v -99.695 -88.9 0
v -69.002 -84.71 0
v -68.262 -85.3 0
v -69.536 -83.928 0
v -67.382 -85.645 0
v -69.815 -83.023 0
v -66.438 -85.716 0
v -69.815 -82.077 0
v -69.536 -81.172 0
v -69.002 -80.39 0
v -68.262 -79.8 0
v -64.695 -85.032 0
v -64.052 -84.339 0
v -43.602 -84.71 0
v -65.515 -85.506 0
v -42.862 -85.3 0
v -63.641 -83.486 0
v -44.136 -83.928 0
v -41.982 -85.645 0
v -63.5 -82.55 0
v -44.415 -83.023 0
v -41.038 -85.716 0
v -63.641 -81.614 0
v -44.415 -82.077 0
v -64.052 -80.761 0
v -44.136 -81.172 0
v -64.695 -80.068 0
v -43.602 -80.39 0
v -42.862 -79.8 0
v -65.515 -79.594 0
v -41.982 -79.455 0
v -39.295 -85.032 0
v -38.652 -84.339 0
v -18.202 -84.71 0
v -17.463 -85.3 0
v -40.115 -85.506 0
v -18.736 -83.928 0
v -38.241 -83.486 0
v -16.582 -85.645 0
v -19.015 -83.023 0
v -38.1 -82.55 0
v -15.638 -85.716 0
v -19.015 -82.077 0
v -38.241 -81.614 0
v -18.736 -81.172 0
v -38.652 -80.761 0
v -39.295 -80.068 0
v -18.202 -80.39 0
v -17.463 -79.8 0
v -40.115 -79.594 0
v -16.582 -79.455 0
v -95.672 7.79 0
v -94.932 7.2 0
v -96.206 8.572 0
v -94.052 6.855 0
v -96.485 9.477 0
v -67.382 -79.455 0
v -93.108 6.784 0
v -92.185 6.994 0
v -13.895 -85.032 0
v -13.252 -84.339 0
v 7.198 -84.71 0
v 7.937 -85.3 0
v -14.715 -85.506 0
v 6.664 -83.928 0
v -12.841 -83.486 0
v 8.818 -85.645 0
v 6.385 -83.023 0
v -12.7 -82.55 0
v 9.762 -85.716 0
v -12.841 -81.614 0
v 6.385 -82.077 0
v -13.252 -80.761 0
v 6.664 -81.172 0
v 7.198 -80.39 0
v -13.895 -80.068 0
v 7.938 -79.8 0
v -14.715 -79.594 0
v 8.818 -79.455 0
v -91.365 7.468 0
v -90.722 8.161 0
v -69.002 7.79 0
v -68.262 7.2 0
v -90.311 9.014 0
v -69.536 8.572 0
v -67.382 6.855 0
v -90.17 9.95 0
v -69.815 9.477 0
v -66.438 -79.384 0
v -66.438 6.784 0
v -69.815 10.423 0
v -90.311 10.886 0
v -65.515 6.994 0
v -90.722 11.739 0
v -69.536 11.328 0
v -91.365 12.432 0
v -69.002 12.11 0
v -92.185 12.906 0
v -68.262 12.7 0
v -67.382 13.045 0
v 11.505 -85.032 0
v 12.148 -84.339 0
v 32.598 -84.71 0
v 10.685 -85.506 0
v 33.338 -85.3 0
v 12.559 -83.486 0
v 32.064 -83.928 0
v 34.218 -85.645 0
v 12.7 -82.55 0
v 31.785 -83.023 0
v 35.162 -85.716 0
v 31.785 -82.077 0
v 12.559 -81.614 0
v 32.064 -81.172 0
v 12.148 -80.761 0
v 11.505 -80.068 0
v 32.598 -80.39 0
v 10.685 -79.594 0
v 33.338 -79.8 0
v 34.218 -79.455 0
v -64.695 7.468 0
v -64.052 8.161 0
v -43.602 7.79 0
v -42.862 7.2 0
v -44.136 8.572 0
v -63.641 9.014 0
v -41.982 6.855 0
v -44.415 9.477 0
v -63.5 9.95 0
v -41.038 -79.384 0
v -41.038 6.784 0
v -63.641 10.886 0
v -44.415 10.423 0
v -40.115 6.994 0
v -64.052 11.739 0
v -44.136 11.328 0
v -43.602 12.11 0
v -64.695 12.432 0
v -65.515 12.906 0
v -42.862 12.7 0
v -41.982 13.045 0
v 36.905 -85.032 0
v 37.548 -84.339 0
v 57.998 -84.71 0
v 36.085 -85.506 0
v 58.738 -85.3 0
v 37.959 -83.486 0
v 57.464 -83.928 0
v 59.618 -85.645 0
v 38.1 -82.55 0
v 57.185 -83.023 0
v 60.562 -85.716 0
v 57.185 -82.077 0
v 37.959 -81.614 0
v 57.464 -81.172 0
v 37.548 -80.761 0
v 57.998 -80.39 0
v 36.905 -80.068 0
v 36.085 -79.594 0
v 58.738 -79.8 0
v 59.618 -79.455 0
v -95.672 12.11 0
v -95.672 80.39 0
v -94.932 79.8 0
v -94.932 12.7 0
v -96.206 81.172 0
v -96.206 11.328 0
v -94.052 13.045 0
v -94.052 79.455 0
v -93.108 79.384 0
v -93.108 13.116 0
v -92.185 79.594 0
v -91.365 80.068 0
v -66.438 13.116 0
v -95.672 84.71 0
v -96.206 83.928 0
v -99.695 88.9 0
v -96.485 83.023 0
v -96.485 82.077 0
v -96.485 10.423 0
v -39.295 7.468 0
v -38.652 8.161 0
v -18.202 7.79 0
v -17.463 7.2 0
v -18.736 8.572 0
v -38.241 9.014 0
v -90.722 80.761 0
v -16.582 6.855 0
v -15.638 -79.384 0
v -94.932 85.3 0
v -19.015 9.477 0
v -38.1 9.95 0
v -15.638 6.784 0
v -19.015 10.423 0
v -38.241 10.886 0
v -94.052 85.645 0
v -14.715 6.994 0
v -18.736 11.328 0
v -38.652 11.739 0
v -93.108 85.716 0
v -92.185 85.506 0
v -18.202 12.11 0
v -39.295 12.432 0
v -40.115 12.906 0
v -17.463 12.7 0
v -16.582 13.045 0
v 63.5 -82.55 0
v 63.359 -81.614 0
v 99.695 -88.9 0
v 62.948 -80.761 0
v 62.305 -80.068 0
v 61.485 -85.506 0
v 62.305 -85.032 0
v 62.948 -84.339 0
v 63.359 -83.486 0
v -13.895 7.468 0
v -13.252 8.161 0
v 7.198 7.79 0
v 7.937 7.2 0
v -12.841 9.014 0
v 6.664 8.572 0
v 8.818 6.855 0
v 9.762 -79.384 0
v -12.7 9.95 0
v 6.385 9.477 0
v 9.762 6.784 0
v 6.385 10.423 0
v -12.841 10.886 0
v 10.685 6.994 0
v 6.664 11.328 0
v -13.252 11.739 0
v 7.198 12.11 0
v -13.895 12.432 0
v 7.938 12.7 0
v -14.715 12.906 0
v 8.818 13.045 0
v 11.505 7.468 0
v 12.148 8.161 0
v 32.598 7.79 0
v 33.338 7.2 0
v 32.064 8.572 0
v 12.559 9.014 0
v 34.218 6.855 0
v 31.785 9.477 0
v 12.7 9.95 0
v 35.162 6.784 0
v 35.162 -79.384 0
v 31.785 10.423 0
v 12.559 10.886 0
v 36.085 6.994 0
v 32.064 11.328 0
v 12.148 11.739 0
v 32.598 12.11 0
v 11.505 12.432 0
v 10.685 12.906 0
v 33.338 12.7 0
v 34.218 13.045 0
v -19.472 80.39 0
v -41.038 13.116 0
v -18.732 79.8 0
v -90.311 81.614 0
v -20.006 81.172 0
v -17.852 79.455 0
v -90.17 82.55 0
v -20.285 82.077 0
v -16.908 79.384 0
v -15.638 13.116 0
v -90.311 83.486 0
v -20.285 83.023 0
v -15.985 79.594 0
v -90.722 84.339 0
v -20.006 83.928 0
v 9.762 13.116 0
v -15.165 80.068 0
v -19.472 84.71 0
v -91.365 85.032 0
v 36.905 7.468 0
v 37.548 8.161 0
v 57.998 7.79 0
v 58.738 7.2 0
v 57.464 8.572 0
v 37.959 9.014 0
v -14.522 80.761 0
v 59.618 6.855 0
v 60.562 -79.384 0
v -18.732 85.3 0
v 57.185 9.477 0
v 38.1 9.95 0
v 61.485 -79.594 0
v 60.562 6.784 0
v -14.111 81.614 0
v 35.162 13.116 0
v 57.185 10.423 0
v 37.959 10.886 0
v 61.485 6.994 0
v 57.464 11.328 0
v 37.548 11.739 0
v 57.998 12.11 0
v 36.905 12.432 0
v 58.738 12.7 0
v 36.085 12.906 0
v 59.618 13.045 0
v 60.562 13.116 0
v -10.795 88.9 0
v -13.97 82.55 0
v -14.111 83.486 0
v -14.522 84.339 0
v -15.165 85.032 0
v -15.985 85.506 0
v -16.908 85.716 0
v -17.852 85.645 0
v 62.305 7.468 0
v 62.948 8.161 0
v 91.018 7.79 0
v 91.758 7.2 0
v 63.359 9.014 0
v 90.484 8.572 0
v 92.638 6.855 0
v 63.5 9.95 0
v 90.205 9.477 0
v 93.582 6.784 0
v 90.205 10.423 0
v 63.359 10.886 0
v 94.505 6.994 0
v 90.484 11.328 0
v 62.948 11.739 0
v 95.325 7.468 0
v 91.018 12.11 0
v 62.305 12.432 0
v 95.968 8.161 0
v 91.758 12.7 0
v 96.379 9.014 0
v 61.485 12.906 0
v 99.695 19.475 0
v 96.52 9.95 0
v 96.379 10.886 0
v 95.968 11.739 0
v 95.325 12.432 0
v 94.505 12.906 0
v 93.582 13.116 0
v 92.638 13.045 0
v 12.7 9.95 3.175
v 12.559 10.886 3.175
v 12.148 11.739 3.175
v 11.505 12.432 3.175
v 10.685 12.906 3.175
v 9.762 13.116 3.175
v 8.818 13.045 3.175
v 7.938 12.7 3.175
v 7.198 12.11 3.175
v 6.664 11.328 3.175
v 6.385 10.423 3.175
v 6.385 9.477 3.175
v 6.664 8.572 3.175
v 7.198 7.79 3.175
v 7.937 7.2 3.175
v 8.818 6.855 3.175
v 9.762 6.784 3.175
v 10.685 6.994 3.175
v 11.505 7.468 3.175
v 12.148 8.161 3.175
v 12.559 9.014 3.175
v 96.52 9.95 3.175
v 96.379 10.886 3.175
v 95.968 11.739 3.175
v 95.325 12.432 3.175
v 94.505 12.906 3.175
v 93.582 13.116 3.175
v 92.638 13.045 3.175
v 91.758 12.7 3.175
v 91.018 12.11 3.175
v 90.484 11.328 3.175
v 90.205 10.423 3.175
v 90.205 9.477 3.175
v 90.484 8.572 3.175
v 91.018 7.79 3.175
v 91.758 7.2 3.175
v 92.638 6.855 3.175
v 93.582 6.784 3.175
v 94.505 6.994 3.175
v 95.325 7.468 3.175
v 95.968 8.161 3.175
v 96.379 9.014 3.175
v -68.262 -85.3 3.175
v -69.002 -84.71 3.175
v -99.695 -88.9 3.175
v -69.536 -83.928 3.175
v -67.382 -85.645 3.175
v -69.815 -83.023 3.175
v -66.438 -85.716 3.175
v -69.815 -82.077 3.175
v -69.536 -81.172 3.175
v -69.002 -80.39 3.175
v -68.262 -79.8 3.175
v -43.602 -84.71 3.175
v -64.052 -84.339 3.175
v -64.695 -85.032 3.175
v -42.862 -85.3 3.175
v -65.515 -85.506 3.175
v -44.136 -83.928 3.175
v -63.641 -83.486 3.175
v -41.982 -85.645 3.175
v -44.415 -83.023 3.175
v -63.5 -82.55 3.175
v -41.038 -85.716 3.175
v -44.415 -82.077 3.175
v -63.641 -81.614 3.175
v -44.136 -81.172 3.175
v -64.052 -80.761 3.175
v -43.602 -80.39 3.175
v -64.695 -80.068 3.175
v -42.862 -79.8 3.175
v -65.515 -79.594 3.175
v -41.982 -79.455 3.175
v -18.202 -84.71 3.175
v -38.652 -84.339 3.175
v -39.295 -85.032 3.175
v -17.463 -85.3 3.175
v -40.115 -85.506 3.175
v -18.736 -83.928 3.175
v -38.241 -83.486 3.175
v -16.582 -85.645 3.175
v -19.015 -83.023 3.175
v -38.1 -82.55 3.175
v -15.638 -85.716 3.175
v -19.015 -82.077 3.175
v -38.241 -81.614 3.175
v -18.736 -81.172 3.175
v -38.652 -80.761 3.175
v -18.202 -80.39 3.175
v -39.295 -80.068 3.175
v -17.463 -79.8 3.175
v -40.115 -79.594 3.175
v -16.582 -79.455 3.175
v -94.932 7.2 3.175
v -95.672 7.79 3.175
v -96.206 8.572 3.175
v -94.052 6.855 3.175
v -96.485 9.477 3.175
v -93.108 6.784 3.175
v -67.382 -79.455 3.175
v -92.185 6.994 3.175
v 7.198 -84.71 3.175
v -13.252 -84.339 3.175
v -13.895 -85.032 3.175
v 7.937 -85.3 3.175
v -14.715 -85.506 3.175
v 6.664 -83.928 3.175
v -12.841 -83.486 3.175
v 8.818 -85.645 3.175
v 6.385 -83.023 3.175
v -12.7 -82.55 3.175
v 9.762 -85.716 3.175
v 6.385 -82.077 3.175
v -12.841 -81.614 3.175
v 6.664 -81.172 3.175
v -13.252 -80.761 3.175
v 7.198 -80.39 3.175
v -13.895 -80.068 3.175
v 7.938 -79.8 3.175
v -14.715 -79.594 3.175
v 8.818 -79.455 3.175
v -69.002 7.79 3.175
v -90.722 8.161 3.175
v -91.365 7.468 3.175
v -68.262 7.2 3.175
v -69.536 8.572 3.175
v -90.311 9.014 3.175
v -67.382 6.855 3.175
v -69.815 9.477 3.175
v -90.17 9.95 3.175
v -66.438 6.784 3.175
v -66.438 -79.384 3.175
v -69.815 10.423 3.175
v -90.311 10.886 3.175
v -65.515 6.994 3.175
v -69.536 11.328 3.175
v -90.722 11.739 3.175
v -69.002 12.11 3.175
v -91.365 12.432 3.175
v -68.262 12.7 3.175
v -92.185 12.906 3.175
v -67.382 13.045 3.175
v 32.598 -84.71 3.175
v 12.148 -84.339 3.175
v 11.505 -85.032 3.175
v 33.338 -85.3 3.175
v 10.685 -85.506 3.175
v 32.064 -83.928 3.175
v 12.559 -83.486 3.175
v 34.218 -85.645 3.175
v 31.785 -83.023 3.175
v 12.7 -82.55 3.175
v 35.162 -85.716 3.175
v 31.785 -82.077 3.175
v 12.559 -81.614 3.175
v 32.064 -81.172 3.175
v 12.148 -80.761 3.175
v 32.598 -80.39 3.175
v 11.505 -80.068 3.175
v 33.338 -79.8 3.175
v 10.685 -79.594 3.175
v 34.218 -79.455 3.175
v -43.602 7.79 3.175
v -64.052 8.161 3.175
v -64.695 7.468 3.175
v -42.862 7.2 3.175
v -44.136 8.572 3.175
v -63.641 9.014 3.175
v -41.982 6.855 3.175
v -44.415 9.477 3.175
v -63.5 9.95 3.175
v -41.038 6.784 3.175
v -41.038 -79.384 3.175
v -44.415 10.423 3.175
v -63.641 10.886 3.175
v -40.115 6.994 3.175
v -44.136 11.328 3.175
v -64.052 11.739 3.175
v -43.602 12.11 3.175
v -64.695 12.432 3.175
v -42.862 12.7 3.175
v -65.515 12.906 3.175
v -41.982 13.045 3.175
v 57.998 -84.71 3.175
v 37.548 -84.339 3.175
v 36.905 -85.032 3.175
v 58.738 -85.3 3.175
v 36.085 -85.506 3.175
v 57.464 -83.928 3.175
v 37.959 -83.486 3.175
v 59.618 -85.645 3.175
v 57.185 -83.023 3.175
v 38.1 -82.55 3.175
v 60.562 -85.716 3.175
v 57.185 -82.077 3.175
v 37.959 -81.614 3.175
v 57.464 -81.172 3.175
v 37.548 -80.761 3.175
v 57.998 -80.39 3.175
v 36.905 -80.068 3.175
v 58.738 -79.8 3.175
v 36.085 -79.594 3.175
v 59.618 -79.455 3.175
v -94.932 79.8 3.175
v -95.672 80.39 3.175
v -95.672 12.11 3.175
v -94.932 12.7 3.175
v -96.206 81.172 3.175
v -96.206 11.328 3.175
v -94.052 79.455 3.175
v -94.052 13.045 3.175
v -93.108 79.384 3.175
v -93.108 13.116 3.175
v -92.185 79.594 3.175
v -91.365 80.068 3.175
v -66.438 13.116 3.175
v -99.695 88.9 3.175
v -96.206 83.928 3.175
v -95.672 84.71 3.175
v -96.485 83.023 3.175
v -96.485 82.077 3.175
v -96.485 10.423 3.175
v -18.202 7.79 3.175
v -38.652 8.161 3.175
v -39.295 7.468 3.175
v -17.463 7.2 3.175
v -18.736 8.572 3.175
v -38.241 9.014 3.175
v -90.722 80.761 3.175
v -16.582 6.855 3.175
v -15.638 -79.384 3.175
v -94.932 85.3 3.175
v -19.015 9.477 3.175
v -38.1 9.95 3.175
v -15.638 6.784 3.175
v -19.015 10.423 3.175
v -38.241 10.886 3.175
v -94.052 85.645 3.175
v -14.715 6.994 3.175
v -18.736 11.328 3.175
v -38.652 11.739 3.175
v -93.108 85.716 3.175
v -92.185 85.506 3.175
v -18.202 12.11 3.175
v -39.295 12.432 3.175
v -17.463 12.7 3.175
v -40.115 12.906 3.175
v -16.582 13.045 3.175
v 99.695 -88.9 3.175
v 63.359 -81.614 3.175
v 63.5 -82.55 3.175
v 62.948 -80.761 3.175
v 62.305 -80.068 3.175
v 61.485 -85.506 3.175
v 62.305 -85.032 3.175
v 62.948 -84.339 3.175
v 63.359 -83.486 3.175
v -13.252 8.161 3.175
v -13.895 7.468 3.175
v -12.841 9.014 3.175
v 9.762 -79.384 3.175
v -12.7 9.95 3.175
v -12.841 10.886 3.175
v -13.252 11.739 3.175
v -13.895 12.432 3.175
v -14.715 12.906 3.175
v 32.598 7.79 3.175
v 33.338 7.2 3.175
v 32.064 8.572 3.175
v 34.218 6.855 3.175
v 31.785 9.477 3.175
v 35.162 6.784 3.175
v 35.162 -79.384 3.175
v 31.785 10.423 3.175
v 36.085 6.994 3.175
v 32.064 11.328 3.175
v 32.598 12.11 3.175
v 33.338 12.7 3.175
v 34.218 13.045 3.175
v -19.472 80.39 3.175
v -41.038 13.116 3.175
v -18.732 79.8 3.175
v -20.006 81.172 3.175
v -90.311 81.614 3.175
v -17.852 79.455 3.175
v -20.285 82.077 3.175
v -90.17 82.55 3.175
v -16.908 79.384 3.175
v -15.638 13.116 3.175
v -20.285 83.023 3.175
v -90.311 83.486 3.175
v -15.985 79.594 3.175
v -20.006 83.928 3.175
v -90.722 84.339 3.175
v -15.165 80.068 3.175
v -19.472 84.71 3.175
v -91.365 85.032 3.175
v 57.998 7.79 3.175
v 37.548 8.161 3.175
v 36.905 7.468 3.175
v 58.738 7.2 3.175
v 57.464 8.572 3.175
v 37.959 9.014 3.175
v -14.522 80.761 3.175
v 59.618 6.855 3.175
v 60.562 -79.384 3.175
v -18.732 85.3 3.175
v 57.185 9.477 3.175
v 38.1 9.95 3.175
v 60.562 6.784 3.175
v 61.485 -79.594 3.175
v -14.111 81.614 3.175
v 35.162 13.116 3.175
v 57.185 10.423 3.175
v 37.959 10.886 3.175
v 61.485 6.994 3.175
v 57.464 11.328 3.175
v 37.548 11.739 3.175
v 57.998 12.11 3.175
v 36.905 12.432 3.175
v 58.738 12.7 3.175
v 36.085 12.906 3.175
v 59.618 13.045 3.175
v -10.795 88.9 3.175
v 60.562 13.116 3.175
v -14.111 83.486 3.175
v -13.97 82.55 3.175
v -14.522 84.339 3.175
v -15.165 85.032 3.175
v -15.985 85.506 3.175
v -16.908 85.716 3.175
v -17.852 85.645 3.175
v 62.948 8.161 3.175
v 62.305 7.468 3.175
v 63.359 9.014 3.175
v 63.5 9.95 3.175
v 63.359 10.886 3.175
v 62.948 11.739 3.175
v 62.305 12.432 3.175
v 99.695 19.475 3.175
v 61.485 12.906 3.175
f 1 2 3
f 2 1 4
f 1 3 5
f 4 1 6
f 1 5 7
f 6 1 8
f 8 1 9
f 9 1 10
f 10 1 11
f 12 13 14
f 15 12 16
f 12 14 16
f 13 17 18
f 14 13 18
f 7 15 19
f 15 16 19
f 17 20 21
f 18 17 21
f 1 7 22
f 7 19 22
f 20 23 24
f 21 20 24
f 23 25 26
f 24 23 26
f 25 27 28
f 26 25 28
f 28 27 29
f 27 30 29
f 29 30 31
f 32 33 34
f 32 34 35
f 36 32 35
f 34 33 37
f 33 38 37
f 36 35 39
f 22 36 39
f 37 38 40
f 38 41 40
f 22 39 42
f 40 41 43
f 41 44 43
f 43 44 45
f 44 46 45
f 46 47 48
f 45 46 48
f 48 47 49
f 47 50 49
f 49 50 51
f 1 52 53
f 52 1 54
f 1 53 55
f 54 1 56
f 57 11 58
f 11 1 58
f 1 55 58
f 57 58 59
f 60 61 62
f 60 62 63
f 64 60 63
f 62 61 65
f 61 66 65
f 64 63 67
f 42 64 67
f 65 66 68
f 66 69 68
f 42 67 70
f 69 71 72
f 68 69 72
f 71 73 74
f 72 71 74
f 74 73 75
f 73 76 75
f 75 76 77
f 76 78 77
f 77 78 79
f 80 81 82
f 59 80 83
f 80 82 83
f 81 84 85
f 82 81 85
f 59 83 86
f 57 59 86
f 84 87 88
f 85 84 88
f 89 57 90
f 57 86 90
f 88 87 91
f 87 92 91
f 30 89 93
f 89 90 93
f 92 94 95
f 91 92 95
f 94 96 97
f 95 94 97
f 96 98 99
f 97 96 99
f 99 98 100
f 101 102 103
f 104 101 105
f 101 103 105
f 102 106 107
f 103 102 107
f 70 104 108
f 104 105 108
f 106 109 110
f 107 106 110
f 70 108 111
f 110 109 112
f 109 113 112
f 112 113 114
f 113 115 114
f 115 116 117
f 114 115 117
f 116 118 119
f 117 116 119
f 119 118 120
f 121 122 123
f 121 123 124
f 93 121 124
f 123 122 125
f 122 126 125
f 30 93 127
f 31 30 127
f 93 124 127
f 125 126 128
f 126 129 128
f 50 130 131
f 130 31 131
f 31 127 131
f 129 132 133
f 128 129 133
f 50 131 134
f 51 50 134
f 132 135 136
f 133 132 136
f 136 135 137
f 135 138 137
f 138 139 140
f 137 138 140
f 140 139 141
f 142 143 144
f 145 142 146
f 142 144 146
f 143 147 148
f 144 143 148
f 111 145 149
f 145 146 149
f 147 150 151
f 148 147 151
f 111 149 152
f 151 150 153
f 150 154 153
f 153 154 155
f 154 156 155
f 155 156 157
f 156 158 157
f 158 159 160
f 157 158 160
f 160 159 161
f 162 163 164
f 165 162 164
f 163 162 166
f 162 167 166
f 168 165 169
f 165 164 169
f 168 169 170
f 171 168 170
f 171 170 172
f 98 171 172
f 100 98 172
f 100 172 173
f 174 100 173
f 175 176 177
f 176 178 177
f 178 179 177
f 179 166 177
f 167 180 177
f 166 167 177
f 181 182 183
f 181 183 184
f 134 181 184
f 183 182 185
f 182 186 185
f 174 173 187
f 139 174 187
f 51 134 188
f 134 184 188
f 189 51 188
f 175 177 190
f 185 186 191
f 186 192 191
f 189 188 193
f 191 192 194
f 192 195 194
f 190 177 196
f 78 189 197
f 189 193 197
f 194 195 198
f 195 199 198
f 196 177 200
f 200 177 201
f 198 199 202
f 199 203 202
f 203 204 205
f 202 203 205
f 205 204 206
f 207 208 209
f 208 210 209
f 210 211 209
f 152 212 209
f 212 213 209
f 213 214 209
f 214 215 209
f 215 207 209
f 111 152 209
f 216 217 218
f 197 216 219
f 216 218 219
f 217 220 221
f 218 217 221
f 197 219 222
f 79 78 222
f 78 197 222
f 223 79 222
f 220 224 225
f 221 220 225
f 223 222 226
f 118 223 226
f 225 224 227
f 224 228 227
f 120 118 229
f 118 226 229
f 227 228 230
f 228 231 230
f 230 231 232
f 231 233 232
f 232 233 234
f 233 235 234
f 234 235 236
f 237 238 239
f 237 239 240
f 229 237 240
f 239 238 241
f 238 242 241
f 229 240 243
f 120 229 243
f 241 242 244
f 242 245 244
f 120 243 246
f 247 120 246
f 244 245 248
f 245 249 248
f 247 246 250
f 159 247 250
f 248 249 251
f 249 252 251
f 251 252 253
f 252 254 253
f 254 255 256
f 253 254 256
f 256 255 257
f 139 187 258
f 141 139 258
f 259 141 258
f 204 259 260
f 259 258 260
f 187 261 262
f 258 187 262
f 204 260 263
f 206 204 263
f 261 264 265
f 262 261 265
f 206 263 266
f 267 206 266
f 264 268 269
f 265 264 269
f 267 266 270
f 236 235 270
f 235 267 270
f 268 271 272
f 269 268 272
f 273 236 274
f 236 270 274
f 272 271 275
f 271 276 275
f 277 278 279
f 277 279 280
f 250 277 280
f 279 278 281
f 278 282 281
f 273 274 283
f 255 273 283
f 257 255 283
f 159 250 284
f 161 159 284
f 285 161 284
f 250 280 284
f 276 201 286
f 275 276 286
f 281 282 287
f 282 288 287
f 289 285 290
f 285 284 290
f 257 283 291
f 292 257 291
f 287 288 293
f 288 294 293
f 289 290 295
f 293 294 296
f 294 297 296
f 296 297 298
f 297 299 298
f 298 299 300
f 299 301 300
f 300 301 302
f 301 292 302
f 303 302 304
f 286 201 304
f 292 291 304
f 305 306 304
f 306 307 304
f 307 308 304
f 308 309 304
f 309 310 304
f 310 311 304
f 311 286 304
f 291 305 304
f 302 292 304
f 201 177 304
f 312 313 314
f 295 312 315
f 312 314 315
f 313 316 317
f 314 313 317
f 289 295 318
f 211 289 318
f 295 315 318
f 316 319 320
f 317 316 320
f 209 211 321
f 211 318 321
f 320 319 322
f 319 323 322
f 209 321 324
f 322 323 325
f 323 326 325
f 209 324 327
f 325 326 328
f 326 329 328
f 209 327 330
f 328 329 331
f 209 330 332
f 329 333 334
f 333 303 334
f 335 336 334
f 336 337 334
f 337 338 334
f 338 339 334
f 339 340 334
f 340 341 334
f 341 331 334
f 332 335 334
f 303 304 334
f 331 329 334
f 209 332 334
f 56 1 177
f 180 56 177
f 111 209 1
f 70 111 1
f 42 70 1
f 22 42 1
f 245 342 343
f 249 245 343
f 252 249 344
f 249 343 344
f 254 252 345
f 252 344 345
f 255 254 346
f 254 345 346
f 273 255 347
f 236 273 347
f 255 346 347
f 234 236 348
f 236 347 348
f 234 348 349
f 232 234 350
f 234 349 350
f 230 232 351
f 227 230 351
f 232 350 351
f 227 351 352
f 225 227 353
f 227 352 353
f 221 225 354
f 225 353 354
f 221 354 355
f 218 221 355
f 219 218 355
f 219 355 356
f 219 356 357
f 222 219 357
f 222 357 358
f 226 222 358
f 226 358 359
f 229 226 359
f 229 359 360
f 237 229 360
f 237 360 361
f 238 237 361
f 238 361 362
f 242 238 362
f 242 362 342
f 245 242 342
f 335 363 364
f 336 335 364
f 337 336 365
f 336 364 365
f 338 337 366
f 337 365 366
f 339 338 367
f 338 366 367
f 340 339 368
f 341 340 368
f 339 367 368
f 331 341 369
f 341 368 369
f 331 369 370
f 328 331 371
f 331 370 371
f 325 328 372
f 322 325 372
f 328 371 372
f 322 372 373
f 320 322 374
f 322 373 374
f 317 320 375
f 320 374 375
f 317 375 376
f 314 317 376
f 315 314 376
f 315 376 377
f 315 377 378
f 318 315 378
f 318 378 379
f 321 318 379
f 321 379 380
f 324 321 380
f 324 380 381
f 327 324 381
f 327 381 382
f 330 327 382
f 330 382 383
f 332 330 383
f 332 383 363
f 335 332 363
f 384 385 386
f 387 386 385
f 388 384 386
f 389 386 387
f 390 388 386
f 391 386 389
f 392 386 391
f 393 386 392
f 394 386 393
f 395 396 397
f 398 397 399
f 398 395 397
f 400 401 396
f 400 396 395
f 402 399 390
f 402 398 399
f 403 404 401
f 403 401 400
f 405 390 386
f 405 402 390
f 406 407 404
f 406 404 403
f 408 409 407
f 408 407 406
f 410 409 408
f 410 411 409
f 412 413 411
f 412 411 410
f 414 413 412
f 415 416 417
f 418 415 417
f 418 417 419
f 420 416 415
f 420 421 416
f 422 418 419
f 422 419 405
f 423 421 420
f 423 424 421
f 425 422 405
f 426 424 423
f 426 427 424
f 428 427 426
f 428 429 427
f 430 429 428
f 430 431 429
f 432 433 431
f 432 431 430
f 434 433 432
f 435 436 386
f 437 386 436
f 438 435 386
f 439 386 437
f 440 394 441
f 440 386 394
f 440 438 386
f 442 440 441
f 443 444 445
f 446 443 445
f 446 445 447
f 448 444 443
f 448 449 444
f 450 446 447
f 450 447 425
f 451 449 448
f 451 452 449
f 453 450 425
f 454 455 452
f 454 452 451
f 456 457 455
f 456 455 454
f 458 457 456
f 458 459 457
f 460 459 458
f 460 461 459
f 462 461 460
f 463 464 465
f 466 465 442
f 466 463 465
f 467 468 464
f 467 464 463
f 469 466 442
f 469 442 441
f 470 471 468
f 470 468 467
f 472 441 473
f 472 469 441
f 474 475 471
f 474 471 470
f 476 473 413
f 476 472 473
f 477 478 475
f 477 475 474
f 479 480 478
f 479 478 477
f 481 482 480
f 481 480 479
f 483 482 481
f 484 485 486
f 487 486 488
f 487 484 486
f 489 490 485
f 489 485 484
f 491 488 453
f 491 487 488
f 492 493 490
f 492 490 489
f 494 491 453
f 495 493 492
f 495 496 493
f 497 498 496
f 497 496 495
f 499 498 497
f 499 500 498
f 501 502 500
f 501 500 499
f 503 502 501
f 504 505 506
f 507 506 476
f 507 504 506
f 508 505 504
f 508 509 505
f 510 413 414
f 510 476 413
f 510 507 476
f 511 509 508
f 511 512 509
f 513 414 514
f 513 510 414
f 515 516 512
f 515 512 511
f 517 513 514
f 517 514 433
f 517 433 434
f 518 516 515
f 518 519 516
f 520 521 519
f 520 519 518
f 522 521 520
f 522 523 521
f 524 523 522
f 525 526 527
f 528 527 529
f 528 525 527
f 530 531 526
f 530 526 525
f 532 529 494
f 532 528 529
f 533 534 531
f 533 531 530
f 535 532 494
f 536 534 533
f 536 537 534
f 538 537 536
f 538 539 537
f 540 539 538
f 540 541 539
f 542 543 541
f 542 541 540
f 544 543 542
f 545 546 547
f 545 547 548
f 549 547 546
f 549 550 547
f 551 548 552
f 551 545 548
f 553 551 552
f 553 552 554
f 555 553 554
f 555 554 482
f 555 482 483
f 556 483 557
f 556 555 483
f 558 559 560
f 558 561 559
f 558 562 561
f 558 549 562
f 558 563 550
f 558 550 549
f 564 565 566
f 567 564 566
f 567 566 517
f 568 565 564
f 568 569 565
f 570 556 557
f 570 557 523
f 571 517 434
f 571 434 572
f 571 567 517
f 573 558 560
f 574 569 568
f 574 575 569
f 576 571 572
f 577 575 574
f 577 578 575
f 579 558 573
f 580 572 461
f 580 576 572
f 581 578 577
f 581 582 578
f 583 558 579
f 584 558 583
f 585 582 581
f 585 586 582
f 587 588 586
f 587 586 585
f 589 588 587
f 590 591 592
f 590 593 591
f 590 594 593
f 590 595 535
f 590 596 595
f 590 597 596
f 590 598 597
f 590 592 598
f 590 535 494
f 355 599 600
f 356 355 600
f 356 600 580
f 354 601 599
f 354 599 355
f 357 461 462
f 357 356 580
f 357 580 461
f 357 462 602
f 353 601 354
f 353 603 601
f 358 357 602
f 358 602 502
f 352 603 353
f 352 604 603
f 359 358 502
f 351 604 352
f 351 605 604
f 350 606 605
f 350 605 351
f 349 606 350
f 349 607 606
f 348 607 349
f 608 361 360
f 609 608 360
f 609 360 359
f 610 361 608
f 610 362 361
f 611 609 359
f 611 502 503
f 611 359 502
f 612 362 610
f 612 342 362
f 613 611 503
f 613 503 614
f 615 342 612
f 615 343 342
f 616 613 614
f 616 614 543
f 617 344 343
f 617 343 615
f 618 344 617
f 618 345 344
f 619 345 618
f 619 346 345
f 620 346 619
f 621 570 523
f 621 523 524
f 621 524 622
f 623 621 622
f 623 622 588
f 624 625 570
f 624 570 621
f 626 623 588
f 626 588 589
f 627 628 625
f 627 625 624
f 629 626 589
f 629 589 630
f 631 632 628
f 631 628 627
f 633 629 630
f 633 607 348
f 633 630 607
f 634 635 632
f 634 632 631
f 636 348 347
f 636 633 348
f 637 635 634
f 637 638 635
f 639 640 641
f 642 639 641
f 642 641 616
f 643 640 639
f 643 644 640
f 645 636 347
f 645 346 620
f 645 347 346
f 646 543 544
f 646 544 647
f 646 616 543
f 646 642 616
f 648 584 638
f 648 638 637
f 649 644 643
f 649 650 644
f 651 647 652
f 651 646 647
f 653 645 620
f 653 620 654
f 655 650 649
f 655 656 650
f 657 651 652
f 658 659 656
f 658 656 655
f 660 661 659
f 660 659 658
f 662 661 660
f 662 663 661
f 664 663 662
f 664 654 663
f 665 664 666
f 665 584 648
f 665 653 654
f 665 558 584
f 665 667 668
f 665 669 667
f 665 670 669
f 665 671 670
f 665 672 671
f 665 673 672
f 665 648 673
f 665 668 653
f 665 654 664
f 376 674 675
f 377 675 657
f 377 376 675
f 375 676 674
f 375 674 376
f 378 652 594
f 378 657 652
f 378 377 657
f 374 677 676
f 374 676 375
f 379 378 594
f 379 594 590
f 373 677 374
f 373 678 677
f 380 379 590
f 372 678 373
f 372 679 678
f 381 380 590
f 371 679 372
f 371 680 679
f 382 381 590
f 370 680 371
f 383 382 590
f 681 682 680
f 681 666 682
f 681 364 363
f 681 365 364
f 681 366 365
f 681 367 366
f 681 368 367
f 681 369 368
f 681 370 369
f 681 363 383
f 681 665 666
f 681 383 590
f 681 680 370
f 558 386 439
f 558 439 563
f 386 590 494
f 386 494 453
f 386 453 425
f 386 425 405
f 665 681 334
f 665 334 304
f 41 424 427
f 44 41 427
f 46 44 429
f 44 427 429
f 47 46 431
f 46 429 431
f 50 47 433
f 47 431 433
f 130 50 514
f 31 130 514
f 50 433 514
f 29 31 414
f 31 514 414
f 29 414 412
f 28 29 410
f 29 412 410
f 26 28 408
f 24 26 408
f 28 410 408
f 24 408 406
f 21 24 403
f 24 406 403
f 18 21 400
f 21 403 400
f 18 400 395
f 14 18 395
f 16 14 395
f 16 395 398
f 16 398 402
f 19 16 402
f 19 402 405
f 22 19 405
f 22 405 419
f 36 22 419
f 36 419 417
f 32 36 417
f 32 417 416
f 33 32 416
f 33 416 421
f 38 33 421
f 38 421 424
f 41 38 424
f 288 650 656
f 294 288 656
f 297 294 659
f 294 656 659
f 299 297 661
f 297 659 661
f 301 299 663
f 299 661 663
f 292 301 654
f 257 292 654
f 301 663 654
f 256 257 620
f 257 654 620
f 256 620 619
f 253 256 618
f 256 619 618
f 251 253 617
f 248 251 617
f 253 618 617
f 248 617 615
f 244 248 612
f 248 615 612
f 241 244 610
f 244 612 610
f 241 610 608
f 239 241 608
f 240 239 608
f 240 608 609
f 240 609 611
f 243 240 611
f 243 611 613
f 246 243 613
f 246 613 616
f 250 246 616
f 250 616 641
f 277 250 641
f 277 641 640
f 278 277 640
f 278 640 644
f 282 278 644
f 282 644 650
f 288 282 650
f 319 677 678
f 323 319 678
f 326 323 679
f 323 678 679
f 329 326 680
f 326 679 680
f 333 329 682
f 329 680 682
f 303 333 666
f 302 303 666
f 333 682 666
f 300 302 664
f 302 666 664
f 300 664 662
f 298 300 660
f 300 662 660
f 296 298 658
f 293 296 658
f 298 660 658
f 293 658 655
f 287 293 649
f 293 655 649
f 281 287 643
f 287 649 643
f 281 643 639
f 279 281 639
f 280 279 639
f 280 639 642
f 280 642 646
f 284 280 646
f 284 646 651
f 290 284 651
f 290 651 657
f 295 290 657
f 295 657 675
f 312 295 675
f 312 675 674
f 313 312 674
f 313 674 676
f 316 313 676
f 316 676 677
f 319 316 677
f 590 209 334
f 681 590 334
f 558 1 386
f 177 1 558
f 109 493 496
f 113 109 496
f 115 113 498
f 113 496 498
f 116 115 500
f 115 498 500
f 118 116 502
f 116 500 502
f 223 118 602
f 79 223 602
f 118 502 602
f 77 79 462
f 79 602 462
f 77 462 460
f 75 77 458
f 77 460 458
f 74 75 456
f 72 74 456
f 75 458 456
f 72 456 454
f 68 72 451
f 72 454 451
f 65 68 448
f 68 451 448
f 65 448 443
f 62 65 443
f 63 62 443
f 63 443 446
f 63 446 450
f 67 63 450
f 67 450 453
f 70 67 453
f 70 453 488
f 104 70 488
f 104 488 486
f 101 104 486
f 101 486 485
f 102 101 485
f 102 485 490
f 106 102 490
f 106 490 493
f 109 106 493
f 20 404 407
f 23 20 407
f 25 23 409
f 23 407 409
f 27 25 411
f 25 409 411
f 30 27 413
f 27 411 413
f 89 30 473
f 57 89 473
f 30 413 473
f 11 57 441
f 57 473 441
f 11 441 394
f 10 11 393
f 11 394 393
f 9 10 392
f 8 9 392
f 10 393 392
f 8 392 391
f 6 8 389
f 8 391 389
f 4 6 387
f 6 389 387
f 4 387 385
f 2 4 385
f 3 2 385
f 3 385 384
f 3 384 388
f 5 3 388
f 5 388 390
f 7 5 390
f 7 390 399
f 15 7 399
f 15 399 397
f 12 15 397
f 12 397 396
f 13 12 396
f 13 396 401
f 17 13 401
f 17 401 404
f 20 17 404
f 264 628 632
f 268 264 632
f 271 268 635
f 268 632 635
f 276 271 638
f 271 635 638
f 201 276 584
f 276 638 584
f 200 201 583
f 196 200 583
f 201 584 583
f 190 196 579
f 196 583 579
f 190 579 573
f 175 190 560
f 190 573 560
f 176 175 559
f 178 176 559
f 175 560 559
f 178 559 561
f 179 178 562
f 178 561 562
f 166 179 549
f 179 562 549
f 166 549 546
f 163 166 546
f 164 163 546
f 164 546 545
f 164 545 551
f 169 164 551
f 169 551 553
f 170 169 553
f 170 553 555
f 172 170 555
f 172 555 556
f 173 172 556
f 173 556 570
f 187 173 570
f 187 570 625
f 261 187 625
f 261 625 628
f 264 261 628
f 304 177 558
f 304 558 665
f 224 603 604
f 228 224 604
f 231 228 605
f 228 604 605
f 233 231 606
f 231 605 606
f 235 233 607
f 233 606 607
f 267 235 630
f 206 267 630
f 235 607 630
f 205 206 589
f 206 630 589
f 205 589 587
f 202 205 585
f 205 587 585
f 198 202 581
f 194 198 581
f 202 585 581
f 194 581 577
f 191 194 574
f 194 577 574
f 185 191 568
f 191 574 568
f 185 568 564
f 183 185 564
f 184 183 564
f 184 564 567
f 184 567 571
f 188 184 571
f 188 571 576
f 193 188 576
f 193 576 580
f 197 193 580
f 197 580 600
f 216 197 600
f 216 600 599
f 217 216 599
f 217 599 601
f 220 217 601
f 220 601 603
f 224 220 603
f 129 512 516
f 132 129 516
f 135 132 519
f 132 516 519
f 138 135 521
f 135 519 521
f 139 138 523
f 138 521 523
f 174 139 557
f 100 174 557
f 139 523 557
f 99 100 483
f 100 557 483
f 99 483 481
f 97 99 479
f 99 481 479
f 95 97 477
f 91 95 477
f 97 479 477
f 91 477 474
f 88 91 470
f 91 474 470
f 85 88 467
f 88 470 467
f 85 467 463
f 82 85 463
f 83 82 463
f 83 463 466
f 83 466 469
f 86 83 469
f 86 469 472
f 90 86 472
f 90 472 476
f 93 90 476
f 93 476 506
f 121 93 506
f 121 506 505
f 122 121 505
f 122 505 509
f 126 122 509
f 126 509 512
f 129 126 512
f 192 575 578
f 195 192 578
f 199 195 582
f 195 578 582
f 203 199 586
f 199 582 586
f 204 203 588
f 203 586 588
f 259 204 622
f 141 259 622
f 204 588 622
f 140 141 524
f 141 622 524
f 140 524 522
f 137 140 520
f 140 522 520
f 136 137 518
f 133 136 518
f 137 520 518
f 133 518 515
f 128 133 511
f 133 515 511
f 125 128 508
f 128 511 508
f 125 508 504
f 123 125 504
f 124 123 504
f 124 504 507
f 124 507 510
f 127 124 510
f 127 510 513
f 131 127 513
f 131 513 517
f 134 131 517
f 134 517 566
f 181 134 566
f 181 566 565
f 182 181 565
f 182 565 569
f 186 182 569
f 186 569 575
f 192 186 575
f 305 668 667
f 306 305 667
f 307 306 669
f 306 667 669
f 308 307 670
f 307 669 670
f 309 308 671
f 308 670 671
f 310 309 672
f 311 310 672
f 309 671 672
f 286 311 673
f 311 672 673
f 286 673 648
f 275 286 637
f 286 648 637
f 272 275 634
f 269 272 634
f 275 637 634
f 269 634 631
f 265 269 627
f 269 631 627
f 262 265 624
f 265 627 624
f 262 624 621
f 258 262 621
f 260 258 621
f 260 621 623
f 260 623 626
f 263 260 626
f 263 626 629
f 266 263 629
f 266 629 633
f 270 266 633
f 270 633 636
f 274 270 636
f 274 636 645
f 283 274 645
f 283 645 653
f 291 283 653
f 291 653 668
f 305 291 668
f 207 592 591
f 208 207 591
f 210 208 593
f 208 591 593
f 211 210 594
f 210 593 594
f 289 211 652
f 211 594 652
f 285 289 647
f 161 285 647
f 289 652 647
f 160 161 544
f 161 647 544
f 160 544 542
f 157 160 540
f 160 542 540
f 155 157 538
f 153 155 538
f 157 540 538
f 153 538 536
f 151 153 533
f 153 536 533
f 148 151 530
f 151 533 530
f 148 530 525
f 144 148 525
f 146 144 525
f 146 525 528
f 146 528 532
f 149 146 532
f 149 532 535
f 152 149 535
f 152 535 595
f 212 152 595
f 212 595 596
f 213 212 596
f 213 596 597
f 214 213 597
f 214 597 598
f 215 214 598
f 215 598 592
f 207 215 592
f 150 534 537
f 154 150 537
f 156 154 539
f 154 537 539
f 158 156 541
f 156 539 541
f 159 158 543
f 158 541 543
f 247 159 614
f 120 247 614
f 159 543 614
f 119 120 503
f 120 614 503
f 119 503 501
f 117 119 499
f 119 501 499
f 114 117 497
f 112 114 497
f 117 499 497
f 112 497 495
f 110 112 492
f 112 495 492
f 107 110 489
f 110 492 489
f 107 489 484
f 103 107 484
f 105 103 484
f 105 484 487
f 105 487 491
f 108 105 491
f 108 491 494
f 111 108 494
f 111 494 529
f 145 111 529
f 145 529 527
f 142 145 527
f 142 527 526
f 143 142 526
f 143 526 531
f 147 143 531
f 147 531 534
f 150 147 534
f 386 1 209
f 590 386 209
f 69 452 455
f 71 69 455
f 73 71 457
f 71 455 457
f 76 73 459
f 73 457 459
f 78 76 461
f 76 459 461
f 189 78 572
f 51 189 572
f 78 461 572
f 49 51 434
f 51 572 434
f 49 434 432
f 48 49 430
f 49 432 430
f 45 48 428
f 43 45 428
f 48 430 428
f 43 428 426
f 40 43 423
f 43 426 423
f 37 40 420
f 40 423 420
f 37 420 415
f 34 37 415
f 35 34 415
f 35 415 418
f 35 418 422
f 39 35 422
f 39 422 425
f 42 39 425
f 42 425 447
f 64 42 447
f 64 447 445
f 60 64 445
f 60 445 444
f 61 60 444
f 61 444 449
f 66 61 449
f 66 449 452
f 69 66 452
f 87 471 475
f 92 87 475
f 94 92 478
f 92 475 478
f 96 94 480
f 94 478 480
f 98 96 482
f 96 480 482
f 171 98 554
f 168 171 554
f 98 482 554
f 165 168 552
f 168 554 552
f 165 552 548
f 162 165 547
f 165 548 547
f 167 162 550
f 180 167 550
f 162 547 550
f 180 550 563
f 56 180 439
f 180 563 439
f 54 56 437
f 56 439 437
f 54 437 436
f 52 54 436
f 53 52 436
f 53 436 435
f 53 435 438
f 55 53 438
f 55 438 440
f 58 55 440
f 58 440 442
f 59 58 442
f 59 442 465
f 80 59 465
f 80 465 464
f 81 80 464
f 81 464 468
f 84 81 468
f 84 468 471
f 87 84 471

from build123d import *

# Parameters (mm, degrees)
SKETCH1_W           = 199.39
SKETCH1_H           = 177.8
BOSS_EXTRUDE1_DEPTH = 3.175
CUT_EXTRUDE4_DEPTH  = 134.612812447
SKETCH7_R           = 3.175
CUT_EXTRUDE5_DEPTH  = 134.612812447


with BuildPart() as part:
    # Sketch1 → Boss-Extrude1 (new body)
    with BuildSketch(Plane.XY):
        Rectangle(SKETCH1_W, SKETCH1_H)
    extrude(amount=BOSS_EXTRUDE1_DEPTH)

    # Sketch6 → Cut-Extrude4 (cut, through all)
    with BuildSketch(Plane.XY.offset(3.175)):
        Polygon((99.695, 88.9), (99.695, 19.474999912), (-10.795, 88.9), align=None)
    extrude(amount=-CUT_EXTRUDE4_DEPTH, mode=Mode.SUBTRACT)

    # Sketch7 → Cut-Extrude5 (cut, through all)
    with BuildSketch(Plane.XY.offset(3.175)):
        with Locations((-93.345, 82.55)):
            Circle(SKETCH7_R)
        with Locations((-93.345, 9.949999912)):
            Circle(SKETCH7_R)
        with Locations((93.345, 9.949999912)):
            Circle(SKETCH7_R)
        with Locations((-66.675, 9.949999912)):
            Circle(SKETCH7_R)
        with Locations((-41.275, 9.949999912)):
            Circle(SKETCH7_R)
        with Locations((-15.875, 9.949999912)):
            Circle(SKETCH7_R)
        with Locations((9.525, 9.949999912)):
            Circle(SKETCH7_R)
        with Locations((34.925, 9.949999912)):
            Circle(SKETCH7_R)
        with Locations((60.325, 9.949999912)):
            Circle(SKETCH7_R)
        with Locations((-17.145, 82.55)):
            Circle(SKETCH7_R)
        with Locations((-66.675, -82.55)):
            Circle(SKETCH7_R)
        with Locations((-41.275, -82.55)):
            Circle(SKETCH7_R)
        with Locations((-15.875, -82.55)):
            Circle(SKETCH7_R)
        with Locations((9.525, -82.55)):
            Circle(SKETCH7_R)
        with Locations((34.925, -82.55)):
            Circle(SKETCH7_R)
        with Locations((60.325, -82.55)):
            Circle(SKETCH7_R)
    extrude(amount=-CUT_EXTRUDE5_DEPTH, mode=Mode.SUBTRACT)


solid = part.part
